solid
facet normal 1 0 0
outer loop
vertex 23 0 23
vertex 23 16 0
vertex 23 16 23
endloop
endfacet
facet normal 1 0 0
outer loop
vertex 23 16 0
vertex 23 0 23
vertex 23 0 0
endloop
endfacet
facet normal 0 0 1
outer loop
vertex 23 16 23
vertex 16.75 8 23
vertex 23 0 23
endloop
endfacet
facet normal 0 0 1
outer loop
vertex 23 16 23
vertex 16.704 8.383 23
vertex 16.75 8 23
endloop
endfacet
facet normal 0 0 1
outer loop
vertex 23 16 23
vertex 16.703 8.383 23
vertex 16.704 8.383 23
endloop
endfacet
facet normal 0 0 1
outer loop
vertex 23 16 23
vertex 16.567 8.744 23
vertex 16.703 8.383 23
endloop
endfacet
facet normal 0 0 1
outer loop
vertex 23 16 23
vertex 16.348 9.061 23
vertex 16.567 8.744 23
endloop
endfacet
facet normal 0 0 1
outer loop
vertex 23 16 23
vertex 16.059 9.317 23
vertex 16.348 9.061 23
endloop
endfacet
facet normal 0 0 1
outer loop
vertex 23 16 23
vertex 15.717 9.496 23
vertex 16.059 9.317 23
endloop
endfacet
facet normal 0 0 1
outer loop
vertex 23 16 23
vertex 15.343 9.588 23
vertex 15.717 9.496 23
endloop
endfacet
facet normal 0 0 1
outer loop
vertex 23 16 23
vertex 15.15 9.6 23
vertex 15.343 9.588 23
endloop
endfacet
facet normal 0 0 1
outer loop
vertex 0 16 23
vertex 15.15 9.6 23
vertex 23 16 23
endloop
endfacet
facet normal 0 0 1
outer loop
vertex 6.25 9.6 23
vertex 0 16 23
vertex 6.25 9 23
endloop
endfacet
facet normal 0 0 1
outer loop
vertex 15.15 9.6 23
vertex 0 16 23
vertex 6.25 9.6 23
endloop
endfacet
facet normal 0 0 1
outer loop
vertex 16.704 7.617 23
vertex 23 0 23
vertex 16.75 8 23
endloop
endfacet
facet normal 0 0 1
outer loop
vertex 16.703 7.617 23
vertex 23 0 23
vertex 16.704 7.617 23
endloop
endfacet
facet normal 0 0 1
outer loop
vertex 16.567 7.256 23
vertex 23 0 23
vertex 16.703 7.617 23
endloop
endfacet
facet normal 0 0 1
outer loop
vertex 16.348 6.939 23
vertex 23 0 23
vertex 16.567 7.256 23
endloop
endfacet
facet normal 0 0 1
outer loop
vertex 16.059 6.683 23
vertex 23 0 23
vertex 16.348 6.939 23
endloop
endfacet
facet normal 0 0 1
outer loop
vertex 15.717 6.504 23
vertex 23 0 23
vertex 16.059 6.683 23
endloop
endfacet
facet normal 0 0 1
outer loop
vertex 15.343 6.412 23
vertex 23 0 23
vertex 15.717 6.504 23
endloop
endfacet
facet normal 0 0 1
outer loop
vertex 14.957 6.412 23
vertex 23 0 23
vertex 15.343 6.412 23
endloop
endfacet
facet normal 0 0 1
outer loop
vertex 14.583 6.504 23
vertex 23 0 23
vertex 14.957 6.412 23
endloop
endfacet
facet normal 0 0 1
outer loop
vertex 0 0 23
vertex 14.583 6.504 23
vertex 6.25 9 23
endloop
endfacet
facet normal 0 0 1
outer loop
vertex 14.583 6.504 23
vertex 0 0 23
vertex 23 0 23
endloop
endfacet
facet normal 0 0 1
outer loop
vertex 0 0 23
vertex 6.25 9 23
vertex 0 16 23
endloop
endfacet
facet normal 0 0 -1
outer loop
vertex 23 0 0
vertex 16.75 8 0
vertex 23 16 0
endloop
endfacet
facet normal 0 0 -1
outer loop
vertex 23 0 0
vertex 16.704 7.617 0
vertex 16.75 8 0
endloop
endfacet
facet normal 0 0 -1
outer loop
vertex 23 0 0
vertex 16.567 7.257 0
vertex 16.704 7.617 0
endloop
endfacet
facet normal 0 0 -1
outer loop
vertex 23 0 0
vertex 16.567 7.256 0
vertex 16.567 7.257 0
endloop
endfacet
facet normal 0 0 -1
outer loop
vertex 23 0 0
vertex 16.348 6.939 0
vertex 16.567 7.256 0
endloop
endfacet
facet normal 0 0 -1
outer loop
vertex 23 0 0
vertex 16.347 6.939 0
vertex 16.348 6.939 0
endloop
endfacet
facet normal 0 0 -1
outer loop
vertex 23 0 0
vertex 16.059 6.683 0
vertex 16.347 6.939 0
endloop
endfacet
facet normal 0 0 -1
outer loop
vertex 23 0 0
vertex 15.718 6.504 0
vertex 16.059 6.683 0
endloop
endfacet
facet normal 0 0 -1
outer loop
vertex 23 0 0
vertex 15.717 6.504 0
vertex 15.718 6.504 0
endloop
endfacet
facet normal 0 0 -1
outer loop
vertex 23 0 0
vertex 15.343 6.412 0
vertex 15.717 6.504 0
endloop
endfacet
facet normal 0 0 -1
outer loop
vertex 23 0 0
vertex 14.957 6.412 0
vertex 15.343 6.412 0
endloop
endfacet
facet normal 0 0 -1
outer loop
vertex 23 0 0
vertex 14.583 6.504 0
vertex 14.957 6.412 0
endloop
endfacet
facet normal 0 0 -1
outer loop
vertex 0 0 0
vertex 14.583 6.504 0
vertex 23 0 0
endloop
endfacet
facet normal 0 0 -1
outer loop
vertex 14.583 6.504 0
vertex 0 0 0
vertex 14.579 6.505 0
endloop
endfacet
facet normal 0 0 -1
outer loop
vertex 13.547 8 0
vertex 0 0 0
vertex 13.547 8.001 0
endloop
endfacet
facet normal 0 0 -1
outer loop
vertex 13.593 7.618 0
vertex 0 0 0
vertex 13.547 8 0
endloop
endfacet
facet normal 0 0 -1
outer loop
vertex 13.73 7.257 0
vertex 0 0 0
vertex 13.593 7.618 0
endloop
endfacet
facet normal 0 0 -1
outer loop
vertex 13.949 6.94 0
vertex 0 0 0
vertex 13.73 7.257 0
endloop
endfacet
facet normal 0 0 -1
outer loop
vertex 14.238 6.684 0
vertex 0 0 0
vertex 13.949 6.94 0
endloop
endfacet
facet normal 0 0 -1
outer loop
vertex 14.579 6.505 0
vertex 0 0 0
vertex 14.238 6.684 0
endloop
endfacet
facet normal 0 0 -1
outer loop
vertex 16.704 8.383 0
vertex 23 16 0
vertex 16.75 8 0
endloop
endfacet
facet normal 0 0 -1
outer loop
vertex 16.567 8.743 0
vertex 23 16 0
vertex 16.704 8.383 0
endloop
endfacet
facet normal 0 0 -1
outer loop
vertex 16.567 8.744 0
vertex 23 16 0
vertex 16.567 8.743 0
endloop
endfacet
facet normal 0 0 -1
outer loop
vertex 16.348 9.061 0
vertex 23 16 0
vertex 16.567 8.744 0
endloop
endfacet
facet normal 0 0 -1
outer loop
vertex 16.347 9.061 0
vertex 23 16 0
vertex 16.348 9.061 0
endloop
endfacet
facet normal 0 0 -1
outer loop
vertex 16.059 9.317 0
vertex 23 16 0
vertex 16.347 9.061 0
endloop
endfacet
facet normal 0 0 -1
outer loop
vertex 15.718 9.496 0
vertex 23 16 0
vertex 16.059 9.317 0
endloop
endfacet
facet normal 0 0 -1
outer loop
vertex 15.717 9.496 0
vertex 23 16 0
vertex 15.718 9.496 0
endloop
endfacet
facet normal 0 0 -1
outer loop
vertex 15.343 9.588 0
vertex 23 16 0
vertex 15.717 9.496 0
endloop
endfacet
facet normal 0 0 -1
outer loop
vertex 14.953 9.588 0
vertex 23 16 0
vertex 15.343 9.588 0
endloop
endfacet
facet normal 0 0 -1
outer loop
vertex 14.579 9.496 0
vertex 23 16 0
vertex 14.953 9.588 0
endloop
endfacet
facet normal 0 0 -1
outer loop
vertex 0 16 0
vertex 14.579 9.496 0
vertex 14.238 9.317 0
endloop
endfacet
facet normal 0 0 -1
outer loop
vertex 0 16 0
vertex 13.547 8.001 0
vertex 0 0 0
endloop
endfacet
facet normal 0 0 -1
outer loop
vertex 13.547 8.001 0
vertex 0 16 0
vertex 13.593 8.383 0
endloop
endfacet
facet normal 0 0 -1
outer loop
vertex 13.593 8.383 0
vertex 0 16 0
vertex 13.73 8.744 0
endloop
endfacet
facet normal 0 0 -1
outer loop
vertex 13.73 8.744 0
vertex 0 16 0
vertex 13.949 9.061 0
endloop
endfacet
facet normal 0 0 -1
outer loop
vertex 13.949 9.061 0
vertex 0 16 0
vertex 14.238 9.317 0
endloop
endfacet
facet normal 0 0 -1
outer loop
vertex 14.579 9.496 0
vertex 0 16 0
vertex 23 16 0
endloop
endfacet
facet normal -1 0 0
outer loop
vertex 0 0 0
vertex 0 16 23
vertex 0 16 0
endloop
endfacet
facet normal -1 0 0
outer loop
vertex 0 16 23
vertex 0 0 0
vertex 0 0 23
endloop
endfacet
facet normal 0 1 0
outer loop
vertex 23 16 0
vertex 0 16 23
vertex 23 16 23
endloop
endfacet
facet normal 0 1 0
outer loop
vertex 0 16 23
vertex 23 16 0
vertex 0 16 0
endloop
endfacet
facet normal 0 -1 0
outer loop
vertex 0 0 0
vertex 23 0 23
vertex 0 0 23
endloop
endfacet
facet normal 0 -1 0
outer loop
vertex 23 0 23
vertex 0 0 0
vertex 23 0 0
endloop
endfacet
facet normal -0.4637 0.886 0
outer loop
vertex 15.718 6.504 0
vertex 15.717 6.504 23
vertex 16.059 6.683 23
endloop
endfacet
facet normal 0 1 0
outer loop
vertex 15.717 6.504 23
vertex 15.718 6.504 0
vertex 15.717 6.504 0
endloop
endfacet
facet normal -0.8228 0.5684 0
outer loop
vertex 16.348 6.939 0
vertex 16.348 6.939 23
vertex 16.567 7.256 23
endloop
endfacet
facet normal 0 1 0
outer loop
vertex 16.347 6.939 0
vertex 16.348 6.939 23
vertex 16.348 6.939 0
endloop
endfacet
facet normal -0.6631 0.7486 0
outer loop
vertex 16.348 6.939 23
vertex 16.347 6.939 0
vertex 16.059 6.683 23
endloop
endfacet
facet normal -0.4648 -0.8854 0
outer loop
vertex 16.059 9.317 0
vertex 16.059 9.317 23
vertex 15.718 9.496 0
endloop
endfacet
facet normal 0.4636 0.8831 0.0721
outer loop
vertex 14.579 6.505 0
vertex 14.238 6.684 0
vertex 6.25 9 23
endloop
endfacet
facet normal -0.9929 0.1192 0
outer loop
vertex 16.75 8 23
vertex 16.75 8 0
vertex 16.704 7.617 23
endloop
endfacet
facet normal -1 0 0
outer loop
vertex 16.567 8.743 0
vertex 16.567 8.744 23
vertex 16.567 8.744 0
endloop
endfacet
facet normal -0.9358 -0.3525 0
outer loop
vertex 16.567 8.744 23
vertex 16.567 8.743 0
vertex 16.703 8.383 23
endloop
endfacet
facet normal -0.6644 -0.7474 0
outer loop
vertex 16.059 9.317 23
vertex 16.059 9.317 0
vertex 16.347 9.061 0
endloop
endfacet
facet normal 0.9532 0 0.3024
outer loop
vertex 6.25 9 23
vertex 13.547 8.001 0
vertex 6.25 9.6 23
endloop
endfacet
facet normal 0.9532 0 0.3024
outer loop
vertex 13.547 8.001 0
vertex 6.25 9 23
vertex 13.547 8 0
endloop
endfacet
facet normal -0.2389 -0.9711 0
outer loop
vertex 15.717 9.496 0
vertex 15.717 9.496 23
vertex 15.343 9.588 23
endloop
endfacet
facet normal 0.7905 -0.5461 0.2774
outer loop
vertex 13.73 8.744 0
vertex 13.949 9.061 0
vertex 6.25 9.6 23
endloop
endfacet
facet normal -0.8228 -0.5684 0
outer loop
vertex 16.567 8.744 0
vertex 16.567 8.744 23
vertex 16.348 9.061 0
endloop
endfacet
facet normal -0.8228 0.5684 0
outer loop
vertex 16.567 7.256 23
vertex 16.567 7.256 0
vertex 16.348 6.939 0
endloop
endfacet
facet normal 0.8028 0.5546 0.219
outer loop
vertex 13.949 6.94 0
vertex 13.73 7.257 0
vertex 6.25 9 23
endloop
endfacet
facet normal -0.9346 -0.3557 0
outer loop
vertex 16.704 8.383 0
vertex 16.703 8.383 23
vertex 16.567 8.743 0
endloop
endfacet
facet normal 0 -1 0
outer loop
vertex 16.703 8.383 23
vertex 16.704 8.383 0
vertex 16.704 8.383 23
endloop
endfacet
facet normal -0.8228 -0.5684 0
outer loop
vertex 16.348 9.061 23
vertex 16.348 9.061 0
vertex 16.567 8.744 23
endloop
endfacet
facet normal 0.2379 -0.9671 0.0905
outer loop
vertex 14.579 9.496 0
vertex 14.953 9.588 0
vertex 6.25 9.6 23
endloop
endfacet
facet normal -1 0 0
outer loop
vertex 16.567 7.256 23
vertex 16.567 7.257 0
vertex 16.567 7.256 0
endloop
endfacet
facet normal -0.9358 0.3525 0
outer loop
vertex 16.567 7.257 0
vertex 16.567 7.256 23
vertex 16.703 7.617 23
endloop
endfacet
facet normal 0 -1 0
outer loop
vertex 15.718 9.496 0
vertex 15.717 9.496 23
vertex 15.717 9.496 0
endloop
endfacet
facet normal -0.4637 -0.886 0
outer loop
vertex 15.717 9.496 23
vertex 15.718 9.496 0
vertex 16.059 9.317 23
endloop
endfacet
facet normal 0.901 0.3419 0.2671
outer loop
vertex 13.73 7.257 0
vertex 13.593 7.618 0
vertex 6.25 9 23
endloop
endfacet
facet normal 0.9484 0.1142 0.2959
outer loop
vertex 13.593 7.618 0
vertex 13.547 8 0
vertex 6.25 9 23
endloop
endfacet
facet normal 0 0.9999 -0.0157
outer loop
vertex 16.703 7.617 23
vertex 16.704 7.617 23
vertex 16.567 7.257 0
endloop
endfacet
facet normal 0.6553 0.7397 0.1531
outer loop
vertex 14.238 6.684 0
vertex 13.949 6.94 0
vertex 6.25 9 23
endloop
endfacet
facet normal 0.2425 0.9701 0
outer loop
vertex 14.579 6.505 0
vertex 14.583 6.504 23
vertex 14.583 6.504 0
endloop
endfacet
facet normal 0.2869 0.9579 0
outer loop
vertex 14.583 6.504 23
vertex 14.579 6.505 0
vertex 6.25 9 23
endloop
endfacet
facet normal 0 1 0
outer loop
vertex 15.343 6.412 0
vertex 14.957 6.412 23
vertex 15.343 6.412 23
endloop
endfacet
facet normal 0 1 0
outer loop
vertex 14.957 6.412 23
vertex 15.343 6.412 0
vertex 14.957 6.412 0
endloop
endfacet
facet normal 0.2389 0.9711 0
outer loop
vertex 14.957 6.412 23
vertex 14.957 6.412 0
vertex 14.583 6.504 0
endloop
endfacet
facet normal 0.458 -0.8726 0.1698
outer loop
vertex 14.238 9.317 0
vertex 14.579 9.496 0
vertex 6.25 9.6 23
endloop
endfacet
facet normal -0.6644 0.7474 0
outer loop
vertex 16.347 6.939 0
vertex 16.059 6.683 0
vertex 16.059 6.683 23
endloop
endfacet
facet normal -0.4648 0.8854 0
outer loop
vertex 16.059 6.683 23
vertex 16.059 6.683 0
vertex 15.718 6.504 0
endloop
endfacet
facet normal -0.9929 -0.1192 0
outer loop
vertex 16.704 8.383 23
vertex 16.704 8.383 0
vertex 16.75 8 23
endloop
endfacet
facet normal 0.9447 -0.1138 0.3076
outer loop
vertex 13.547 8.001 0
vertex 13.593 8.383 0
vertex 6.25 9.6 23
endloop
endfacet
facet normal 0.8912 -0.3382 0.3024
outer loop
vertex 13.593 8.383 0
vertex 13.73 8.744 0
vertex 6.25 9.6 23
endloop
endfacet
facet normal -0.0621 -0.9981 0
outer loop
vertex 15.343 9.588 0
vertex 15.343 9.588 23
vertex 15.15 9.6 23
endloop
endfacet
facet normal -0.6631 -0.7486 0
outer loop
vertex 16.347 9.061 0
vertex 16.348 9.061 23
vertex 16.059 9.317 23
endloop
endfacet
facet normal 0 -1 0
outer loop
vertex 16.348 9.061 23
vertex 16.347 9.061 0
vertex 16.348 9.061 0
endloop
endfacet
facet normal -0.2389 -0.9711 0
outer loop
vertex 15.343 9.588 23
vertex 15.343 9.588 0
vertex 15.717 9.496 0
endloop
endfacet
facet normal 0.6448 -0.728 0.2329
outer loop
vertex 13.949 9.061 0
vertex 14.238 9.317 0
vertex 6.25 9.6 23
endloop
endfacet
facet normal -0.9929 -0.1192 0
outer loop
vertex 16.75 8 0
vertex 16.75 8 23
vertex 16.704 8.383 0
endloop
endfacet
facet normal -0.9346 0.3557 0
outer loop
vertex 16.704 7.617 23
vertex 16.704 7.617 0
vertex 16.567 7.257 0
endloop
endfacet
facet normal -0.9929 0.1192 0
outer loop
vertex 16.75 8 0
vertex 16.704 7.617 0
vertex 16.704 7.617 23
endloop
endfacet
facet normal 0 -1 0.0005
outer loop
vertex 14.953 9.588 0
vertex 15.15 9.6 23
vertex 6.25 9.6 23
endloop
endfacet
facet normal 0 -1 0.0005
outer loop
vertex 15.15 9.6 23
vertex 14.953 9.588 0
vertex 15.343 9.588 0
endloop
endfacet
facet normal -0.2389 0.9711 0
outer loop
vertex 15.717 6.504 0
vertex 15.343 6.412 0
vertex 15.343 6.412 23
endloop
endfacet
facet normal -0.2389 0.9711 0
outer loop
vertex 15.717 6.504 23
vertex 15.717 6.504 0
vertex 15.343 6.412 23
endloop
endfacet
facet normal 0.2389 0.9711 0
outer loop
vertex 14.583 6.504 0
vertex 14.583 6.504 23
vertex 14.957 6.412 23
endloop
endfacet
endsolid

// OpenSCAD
$fs=.4;
$fa=5;
epsilon=0.01;

module die1() {
    start_d = 0.6;
    start_r = start_d/2;
    end_d = 1.6;
    end_r = end_d/2;
    h=10.5;
    block_size=[23,16,23];
    slot_pos = [block_size.x/2-h/2, block_size.y/2+end_d-start_d];
    nozzle_pos = [block_size.x/2+h/2-end_d, block_size.y/2];
grub_screw_pos=[2,8];
screw_size=3;
clamp_screw_pos=[20.5,8];
heater_pos=[14.5,4];
heater_size=6;
thermistor_pos=[2,5.75];
thermistor_size=3.1;
cube_size=[(block_size.x-heater_pos.x)*1.01, 1.6, block_size.y*1.01];
    module ideal() {
        hull() {
            translate(concat(slot_pos, block_size.z)) cube([h-end_d, start_d, epsilon]);
            translate(concat(nozzle_pos, -epsilon)) cylinder(epsilon, end_d);
        }
    }    

    difference()
    {
        translate([-0,-0,0]) cube(block_size);
        hull() {
            translate([0,0, block_size.z])         
                linear_extrude(epsilon) projection(cut=false) ideal();

            translate(concat(nozzle_pos, -epsilon)) cylinder(epsilon, end_d);
        }
        
    }
}


// E3D V6
module e3dv6() {
    difference() {
        block=[23,16,11.5];
        grub_screw_pos=[2,8];
        screw_size=3;
        nozzle_size=6;
        nozzle_pos=[8,8];
        clamp_screw_pos=[20.5,8];
        heater_pos=[14.5,4];
        heater_size=6;
        thermistor_pos=[2,5.75];
        thermistor_size=3.1;
        cube_size=[(block.x-heater_pos.x)*1.01, 1.6, block.y*1.01];
        cube(block);
        translate([0,0,-epsilon]) {
            translate(grub_screw_pos) cylinder(h=block.z*1.01/2, d=screw_size);
            translate(nozzle_pos) cylinder(h=block.z*1.01, d=nozzle_size);
            translate(clamp_screw_pos) cylinder(h=block.z*1.01, d=screw_size);
        }
        mirror([0,0,1]) rotate([-90,0,0]) translate([0,0,-epsilon]) {
            translate(heater_pos) cylinder(h=block.y*1.01, d=heater_size);
            translate(thermistor_pos) cylinder(h=block.y*1.01, d=thermistor_size);
            translate([heater_pos.x+cube_size.x/2, heater_pos.y, block.y/2]) cube(cube_size, center=true);
        }
    }
}

die1();
